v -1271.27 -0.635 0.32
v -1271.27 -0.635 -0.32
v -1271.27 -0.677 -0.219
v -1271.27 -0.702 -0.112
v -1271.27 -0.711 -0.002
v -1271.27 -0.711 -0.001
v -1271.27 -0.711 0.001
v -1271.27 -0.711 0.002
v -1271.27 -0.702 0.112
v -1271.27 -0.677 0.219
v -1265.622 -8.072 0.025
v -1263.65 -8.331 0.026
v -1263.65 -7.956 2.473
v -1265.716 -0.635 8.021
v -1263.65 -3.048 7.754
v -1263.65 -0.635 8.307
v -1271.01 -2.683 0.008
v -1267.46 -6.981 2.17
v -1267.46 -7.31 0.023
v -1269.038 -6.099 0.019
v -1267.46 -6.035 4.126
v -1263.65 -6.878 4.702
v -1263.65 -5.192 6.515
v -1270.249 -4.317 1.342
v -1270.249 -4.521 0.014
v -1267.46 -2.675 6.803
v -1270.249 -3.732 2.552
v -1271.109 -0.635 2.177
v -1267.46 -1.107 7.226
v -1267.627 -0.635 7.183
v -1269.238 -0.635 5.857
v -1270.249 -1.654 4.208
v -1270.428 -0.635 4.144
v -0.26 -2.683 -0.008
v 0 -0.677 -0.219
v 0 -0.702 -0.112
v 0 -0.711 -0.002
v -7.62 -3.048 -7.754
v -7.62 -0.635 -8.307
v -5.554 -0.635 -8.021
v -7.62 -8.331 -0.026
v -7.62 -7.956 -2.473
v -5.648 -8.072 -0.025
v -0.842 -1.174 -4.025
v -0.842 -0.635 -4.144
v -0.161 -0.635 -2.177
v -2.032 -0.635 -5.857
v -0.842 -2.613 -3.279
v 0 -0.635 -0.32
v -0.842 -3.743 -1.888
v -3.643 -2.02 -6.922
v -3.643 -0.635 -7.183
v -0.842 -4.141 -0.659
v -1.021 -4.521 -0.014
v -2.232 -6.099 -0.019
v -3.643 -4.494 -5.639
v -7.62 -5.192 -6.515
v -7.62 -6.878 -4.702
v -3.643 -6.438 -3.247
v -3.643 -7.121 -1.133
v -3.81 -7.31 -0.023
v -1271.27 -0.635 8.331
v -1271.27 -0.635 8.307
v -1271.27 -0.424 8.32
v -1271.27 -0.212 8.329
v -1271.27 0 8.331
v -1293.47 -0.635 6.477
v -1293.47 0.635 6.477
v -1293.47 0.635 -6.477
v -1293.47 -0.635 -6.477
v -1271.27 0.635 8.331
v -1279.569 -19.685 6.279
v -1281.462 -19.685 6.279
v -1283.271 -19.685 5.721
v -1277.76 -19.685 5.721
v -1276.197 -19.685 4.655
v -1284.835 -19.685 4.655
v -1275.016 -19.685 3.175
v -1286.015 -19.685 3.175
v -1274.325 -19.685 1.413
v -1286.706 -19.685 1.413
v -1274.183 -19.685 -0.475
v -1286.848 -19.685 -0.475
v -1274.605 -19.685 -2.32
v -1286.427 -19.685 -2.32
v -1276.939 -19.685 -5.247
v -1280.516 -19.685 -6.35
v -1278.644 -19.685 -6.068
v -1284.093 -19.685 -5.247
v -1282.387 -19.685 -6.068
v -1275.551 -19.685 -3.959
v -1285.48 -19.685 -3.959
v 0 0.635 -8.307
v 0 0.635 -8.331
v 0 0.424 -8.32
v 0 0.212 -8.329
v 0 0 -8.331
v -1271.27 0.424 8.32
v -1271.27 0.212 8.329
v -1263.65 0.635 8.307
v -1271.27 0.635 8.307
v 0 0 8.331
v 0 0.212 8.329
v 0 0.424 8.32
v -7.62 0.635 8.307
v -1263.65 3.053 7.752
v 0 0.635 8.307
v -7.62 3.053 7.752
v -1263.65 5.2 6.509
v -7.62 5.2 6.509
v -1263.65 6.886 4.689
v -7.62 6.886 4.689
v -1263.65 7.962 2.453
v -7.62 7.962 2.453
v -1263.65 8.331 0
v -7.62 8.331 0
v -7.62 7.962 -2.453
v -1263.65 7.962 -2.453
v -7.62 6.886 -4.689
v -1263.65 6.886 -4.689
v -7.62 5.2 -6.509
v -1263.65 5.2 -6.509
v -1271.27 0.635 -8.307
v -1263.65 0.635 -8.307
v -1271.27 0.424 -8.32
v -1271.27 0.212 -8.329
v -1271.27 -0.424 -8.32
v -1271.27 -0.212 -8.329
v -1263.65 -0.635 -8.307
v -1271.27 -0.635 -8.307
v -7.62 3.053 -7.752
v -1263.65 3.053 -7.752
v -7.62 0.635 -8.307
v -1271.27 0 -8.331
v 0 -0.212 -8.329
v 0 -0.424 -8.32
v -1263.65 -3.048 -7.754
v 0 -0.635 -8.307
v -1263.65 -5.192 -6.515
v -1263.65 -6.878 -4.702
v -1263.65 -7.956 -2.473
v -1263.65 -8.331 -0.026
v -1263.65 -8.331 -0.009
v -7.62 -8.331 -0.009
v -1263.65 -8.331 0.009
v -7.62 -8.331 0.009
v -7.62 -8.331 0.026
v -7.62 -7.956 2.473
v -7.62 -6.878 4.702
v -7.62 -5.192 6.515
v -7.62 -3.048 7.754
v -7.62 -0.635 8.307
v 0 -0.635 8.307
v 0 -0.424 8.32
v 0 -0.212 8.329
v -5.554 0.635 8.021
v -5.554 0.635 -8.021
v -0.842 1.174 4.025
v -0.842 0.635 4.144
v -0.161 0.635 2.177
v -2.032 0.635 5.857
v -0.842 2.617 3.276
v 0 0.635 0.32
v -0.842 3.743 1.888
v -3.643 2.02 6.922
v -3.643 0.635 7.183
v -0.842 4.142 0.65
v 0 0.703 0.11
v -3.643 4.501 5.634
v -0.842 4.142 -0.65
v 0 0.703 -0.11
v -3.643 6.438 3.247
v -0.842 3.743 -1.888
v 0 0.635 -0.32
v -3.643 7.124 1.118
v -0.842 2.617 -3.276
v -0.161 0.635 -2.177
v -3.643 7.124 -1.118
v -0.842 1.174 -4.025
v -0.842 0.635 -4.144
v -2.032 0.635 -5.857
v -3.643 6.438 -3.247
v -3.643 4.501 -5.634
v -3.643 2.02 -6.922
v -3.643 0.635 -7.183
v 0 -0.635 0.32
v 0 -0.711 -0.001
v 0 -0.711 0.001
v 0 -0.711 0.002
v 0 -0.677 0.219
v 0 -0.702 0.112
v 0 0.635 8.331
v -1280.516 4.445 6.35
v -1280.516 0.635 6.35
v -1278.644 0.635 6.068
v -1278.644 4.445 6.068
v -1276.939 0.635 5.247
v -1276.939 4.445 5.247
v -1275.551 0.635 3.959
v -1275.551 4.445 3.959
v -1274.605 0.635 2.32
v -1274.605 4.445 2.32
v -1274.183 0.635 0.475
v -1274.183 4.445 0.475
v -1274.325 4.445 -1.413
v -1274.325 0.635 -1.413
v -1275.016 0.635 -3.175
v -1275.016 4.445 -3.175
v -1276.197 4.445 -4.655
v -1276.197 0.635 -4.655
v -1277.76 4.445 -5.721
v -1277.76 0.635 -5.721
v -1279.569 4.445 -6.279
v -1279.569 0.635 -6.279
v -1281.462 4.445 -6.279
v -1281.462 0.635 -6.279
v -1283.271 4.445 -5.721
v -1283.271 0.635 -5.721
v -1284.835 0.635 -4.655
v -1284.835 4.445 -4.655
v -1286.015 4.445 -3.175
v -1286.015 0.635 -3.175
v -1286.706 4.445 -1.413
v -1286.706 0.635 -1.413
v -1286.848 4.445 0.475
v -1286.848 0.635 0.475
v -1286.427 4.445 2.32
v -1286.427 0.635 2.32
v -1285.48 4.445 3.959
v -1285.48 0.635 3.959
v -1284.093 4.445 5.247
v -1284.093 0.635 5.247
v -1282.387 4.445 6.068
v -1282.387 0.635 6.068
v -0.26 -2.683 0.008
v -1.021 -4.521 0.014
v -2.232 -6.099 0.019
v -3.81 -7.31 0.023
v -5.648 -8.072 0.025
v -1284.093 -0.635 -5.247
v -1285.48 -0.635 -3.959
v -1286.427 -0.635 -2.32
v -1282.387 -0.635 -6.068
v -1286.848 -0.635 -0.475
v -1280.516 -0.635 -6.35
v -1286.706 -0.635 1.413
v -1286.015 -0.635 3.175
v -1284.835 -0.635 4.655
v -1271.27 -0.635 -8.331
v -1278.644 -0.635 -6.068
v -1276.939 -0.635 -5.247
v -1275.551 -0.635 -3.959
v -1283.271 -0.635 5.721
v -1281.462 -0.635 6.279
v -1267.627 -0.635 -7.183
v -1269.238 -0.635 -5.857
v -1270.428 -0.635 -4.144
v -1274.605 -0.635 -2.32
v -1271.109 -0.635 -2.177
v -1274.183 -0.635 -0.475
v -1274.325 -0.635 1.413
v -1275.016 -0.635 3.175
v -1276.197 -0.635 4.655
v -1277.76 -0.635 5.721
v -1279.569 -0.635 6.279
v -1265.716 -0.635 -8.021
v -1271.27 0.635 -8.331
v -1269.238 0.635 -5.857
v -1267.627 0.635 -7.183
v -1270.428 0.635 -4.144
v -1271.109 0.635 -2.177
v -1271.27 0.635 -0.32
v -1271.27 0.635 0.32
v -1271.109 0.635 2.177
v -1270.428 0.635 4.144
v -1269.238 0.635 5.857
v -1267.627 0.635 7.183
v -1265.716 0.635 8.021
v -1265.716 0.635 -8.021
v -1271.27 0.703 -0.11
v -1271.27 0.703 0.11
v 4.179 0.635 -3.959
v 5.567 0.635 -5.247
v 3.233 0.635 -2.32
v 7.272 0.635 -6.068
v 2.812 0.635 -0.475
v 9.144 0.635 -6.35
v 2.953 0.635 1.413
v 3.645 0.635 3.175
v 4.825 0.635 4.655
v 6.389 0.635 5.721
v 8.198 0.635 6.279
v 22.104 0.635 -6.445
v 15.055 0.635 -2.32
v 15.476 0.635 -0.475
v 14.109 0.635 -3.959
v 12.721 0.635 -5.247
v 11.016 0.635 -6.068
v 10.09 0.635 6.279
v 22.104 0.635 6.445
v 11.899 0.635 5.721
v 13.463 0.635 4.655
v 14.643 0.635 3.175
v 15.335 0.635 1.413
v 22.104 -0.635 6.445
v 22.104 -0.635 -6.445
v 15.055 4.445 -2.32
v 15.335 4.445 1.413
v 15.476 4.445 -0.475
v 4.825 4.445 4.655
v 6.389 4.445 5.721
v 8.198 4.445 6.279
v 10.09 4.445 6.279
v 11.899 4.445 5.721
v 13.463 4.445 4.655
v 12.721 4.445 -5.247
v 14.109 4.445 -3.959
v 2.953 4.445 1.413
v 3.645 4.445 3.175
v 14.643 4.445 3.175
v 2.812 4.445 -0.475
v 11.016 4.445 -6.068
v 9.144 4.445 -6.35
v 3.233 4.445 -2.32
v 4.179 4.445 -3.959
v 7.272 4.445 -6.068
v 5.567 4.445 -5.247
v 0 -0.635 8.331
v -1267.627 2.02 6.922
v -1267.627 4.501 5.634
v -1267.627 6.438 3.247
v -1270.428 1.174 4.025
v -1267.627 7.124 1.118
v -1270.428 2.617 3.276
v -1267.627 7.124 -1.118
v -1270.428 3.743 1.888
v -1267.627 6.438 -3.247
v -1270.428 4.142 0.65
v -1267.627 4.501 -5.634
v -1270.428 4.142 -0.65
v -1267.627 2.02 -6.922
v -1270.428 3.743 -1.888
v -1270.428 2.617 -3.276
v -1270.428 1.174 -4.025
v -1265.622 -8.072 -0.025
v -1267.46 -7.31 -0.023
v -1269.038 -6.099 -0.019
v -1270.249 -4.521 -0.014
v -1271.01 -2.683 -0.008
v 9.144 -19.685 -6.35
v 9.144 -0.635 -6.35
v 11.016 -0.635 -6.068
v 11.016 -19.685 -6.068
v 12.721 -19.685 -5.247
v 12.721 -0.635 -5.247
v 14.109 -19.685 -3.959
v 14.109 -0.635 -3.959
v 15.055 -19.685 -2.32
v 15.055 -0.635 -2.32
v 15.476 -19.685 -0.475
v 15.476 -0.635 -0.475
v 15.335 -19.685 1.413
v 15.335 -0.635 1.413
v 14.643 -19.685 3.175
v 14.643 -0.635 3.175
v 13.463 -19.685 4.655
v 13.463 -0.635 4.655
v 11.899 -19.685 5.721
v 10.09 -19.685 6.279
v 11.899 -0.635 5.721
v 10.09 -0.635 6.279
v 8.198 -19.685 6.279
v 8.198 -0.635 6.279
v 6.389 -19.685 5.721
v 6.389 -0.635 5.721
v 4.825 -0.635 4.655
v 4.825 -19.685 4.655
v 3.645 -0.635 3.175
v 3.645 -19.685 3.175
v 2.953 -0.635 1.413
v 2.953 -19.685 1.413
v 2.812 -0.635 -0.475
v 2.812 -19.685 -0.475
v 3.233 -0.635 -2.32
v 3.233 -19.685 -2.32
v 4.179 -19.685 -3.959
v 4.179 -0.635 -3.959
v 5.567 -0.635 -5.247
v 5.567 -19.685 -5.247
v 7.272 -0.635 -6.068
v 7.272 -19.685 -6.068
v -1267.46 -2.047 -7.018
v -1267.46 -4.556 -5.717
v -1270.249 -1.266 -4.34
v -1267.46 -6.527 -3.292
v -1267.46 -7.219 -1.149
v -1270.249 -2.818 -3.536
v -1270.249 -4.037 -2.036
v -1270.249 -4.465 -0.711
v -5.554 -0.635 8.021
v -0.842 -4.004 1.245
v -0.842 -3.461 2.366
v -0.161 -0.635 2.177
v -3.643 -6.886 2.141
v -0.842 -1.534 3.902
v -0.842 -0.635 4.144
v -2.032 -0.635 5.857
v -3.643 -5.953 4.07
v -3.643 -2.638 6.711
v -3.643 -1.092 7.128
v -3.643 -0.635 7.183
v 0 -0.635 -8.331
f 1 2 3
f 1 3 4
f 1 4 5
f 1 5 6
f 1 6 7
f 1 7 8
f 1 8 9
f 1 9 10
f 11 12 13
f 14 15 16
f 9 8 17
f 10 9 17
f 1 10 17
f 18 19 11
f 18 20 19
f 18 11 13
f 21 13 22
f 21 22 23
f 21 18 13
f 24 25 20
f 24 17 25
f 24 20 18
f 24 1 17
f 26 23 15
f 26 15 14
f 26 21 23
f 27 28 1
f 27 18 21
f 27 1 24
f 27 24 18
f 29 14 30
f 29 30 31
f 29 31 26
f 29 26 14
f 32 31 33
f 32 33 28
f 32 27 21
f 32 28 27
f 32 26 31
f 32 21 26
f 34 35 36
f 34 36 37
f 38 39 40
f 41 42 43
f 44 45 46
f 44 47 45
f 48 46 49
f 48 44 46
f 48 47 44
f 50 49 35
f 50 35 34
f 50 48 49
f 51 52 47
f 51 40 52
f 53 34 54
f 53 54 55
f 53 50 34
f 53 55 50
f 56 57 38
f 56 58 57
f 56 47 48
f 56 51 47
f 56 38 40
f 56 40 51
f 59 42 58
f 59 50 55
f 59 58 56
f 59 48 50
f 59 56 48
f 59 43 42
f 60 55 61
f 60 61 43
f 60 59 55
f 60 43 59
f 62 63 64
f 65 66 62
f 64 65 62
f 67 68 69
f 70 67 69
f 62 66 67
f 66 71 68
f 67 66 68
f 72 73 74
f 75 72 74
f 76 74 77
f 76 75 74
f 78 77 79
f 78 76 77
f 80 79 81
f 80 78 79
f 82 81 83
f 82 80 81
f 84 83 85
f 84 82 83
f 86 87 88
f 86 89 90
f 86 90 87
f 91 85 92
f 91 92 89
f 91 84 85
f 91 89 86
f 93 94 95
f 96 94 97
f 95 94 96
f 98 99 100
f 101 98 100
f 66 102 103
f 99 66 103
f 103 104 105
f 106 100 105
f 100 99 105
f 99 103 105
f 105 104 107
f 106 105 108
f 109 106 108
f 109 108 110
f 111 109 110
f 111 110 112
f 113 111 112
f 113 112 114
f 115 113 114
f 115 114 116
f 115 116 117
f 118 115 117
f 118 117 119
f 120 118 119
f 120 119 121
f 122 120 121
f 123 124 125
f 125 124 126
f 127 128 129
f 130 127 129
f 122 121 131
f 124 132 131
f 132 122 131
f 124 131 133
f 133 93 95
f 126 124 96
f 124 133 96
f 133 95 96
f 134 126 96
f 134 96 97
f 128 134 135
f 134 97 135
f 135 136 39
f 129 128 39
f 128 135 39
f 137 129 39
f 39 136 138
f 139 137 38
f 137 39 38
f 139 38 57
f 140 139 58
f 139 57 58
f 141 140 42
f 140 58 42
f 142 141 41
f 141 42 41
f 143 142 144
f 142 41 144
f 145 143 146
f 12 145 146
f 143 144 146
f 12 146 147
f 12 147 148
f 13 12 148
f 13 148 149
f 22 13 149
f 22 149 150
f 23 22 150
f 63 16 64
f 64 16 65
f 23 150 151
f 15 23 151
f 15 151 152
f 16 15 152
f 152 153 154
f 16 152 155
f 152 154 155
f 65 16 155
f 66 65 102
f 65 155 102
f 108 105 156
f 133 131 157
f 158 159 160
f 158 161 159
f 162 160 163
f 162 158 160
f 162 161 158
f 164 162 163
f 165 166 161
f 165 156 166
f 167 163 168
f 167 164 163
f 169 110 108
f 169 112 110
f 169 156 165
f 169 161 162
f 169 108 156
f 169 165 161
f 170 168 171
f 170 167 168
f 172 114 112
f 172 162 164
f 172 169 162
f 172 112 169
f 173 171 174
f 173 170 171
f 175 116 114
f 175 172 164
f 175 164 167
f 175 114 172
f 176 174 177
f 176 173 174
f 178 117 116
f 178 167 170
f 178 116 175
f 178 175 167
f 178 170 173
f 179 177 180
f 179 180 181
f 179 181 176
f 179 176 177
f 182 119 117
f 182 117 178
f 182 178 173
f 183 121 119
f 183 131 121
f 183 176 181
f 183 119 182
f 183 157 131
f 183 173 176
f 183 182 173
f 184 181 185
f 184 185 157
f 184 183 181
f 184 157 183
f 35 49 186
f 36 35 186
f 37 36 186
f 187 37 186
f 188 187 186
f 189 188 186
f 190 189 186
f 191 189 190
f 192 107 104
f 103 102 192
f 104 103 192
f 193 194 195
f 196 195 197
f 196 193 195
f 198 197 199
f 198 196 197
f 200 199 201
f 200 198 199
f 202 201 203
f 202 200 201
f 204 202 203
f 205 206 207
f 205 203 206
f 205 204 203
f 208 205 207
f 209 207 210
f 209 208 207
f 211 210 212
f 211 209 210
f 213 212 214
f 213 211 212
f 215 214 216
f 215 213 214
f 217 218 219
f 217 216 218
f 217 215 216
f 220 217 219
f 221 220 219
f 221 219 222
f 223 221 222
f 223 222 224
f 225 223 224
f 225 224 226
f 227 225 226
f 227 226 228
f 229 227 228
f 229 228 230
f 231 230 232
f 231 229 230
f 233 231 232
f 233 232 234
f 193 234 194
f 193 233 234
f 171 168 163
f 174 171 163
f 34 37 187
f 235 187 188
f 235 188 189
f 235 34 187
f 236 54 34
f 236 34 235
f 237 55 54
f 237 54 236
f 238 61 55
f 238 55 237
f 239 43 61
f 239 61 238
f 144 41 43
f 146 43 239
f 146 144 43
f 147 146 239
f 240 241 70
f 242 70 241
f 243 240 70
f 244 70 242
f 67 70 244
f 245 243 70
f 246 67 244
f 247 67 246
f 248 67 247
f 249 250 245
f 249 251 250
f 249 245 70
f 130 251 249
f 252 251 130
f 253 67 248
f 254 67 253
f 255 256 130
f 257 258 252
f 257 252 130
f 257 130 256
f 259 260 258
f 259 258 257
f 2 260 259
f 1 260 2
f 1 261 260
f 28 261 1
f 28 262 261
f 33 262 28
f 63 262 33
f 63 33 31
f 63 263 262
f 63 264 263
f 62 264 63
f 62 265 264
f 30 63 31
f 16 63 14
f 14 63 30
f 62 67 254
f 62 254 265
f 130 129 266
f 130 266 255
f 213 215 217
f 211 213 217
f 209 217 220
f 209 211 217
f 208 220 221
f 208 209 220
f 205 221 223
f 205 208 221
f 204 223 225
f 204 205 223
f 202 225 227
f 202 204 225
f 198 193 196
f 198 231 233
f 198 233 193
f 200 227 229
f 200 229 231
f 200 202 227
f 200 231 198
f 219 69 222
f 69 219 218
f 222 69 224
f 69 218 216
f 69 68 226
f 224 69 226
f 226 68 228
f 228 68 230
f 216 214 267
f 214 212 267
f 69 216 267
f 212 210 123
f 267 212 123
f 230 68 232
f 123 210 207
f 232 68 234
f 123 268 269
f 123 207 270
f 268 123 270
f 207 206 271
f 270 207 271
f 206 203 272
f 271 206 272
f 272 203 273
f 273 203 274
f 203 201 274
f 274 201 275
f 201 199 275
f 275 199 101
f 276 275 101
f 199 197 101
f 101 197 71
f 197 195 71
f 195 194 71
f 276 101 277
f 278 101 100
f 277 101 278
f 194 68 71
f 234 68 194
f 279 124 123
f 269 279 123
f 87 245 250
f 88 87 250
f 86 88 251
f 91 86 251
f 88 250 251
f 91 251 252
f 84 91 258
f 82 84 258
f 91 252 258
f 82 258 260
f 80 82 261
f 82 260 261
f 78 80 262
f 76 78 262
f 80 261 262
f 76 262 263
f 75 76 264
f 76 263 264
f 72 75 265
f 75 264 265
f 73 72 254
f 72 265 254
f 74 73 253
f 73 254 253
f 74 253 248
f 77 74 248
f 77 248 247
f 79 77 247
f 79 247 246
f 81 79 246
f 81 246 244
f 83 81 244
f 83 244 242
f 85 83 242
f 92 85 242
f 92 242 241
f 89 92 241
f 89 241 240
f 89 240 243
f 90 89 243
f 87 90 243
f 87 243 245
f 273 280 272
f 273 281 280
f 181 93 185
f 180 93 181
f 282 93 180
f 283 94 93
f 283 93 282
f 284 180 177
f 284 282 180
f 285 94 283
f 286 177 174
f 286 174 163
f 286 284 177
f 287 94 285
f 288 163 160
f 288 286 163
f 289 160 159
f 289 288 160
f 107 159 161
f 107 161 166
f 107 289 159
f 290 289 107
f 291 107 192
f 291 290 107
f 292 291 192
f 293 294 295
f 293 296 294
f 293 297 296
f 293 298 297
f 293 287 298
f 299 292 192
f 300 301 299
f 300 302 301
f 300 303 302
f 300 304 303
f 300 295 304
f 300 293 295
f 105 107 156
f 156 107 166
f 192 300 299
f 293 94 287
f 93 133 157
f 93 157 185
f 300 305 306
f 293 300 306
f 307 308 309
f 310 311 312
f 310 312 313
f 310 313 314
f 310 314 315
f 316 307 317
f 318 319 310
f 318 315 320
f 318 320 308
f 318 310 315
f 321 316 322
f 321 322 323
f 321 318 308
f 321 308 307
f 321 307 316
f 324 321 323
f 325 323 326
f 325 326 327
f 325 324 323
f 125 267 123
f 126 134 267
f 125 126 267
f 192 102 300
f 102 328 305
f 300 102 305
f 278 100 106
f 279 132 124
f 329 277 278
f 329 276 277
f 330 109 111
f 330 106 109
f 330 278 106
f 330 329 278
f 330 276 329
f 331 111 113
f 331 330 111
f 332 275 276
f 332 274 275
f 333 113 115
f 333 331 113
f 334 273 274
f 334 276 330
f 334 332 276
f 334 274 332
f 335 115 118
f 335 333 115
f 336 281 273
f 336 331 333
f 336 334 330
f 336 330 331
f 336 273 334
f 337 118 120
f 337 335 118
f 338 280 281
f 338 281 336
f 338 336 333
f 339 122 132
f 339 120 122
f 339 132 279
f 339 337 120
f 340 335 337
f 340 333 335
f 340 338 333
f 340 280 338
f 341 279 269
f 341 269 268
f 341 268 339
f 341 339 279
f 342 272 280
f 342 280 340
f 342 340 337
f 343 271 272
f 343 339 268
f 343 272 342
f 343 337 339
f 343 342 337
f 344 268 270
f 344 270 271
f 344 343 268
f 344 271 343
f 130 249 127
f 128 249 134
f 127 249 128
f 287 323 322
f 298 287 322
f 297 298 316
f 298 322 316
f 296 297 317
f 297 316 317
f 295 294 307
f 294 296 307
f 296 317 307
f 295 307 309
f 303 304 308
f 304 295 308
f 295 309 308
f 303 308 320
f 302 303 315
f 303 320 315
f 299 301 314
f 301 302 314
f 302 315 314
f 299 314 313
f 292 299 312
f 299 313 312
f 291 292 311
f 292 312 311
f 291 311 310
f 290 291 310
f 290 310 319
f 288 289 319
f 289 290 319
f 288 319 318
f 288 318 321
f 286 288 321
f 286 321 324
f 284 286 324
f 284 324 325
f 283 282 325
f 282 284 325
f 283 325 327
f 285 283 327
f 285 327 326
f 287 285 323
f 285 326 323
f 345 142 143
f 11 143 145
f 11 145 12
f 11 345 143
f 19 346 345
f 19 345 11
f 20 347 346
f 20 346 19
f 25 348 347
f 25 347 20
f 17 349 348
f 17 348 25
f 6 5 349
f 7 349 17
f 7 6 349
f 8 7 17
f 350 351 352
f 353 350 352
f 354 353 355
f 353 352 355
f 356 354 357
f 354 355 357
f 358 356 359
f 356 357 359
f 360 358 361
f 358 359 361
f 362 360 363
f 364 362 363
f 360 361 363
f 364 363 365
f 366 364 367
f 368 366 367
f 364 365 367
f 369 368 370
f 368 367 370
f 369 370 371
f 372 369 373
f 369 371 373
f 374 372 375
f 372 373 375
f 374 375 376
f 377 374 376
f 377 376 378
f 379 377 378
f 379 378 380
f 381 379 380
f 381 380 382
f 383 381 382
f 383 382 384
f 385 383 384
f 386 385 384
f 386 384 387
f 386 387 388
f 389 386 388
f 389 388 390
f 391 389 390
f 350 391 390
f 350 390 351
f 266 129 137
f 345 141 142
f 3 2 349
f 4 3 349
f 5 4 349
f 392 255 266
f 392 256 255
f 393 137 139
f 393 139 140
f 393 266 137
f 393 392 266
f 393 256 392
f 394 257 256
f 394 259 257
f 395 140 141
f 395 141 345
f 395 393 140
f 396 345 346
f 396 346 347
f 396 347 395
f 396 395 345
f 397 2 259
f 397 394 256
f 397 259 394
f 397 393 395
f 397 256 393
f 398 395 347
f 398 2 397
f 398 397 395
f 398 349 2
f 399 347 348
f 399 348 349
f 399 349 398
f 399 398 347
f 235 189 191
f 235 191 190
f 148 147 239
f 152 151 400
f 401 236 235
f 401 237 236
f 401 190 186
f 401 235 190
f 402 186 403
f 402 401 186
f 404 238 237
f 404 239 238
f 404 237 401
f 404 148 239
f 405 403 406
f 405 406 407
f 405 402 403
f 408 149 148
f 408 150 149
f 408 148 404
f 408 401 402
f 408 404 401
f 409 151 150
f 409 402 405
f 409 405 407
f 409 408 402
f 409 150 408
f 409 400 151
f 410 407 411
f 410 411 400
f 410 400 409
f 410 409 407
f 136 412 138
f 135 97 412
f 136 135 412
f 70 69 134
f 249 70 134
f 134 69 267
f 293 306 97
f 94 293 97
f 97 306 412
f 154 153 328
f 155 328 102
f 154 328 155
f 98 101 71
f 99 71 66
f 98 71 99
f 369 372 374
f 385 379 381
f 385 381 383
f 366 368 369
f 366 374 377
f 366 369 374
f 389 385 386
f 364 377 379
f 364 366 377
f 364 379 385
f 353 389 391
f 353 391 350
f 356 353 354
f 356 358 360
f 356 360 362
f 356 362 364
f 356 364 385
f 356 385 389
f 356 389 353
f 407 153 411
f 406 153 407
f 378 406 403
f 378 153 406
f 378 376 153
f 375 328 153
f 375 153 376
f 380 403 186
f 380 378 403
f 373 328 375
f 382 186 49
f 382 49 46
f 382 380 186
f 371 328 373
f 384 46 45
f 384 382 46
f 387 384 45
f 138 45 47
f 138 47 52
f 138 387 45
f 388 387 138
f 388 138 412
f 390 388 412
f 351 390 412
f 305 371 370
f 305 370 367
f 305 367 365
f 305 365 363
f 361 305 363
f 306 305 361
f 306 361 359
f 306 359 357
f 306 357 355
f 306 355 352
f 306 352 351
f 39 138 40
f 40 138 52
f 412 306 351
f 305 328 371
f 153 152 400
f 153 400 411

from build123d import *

# Parameters (mm, degrees)
EXTRUSION1_DEPTH      = 0.635
EXTRUSION1_DEPTH_BACK = 0.635
SKETCH1_R             = 6.35
EXTRUSION2_DEPTH      = 19.05
EXTRUSION2_DEPTH_BACK = 19.05
SKETCH2_R             = 6.35
SKETCH3_R             = 6.35
EXTRUSION3_DEPTH      = 13.97
SKETCH4_R             = 6.35
EXTRUSION4_DEPTH      = 3.81
SKETCH5_R             = 8.3312
EXTRUSION5_DEPTH      = 1271.27
SKETCH6_R             = 6.35
EXTRUSION6_DEPTH      = 1.27
SKETCH7_R             = 6.35
EXTRUSION7_DEPTH      = 20.32
FILLET1_R             = 7.62


with BuildPart() as part:
    # Sketch1 → Extrusion1 (new, two sides: drawn at the far end of the back side and taken through both)
    with BuildSketch(Plane(origin=(0, 0, 0), x_dir=(-1, 0, 0), z_dir=(0, 1, 0)).offset(-EXTRUSION1_DEPTH_BACK)):
        Polygon((-22.104096049, 6.444983804), (-22.104096049, -6.444983804), (0, -8.3312), (0, 8.3312), align=None)
        with Locations(Location((-9.144, 0, 0), (0, 0, 90))):
            Circle(SKETCH1_R, mode=Mode.SUBTRACT)
    extrude(amount=EXTRUSION1_DEPTH + EXTRUSION1_DEPTH_BACK)

    # Sketch2 → Extrusion2 (add, two sides: drawn at the far end of the back side and taken through both)
    with BuildSketch(Plane.XZ.offset(0.635).offset(-EXTRUSION2_DEPTH_BACK)):
        with Locations(Location((9.144, 0, 0), (0, 0, 270))):
            Circle(SKETCH2_R)
    extrude(amount=EXTRUSION2_DEPTH + EXTRUSION2_DEPTH_BACK)

    # Sketch3 → Extrusion3 (cut)
    with BuildSketch(Plane(origin=(0, 18.415, 0), x_dir=(-1, 0, 0), z_dir=(0, 1, 0))):
        with Locations(Location((-9.144, 0, 0), (0, 0, 270))):
            Circle(SKETCH3_R)
    extrude(amount=-EXTRUSION3_DEPTH, mode=Mode.SUBTRACT)

    # Sketch5 → Extrusion5 (add)
    with BuildSketch(Plane.ZY):
        Circle(SKETCH5_R)
    extrude(amount=EXTRUSION5_DEPTH)

    # Sketch6 → Extrusion6 (add)
    with BuildSketch(Plane.XZ.offset(-0.635)):
        Polygon((-1293.4696, 0), (-1293.4696, -6.477), (-1271.27, -8.3312), (-1271.27, 8.3312), (-1293.4696, 6.477), align=None)
        with Locations(Location((-1280.5156, 0, 0), (0, 0, 90))):
            Circle(SKETCH6_R, mode=Mode.SUBTRACT)
    extrude(amount=EXTRUSION6_DEPTH)



with BuildPart() as body_2:
    # Sketch4 → Extrusion4 (new body)
    with BuildSketch(Plane(origin=(0, 4.445, 0), x_dir=(-1, 0, 0), z_dir=(0, 1, 0))):
        with Locations(Location((1280.5156, 0, 0), (0, 0, 90))):
            Circle(SKETCH4_R)
    extrude(amount=-EXTRUSION4_DEPTH)


with BuildPart() as part_1:
    add(part.part)

    add(body_2.part)  # Extrusion7 merges body 2
    # Sketch7 → Extrusion7 (add)
    with BuildSketch(Plane.XZ.offset(-0.635)):
        with Locations(Location((-1280.5156, 0, 0), (0, 0, 270))):
            Circle(SKETCH7_R)
    extrude(amount=EXTRUSION7_DEPTH)

    # Fillet1
    # the kernel refuses this fillet: 7.62 mm, written as the material it takes off along each edge
    with BuildSketch(Plane(origin=(-1271.27, 0, 0), x_dir=(0, -0.9999950652018581, 0.003141587485873656), z_dir=(0, -0.003141587485873656, -0.9999950652018581))) as fillet1_piece_1_section:
        with BuildLine():
            CenterArc((8.3312 - FILLET1_R, -FILLET1_R), FILLET1_R, 0, 90)
            Line((8.3312 - FILLET1_R, 0), (8.3312, 0))
            Line((8.3312, 0), (8.3312, -FILLET1_R))
        make_face()
    fillet1_piece_1 = revolve(axis=Axis((-1271.27, 0, 0), (-1, 0, 0)), revolution_arc=359.64, mode=Mode.PRIVATE)
    fillet1_piece_1 = split(fillet1_piece_1, bisect_by=Plane(origin=(-1269.374883086, -0.635, 4.28224122), z_dir=(0, -1, 0)), keep=Keep.TOP, mode=Mode.PRIVATE)
    add(fillet1_piece_1, mode=Mode.SUBTRACT)
    with BuildSketch(Plane(origin=(-1271.27, 0, 0), x_dir=(0, -0.9999950652018581, 0.003141587485873656), z_dir=(0, -0.003141587485873656, -0.9999950652018581))) as fillet1_piece_2_section:
        with BuildLine():
            CenterArc((8.3312 - FILLET1_R, -FILLET1_R), FILLET1_R, 0, 90)
            Line((8.3312 - FILLET1_R, 0), (8.3312, 0))
            Line((8.3312, 0), (8.3312, -FILLET1_R))
        make_face()
    fillet1_piece_2 = revolve(axis=Axis((-1271.27, 0, 0), (-1, 0, 0)), revolution_arc=359.64, mode=Mode.PRIVATE)
    fillet1_piece_2 = split(fillet1_piece_2, bisect_by=Plane(origin=(-1269.082318262, 0.635, 0), z_dir=(0, 1, 0)), keep=Keep.TOP, mode=Mode.PRIVATE)
    add(fillet1_piece_2, mode=Mode.SUBTRACT)
    with BuildSketch(Plane(origin=(0, 0, 0), x_dir=(0, -0.9999950652018581, 0.003141587485874322), z_dir=(0, -0.003141587485874322, -0.9999950652018581))) as fillet1_piece_3_section:
        with BuildLine():
            CenterArc((8.3312 - FILLET1_R, FILLET1_R), FILLET1_R, 270, 90)
            Line((8.3312, FILLET1_R), (8.3312, 0))
            Line((8.3312, 0), (8.3312 - FILLET1_R, 0))
        make_face()
    fillet1_piece_3 = revolve(axis=Axis((0, 0, 0), (-1, 0, 0)), revolution_arc=359.64, mode=Mode.PRIVATE)
    fillet1_piece_3 = split(fillet1_piece_3, bisect_by=Plane(origin=(-1.895117191, -0.635, 4.282241186), z_dir=(0, -1, 0)), keep=Keep.TOP, mode=Mode.PRIVATE)
    add(fillet1_piece_3, mode=Mode.SUBTRACT)
    with BuildSketch(Plane(origin=(0, 0, 0), x_dir=(0, -0.9999950652018581, 0.003141587485874322), z_dir=(0, -0.003141587485874322, -0.9999950652018581))) as fillet1_piece_4_section:
        with BuildLine():
            CenterArc((8.3312 - FILLET1_R, FILLET1_R), FILLET1_R, 270, 90)
            Line((8.3312, FILLET1_R), (8.3312, 0))
            Line((8.3312, 0), (8.3312 - FILLET1_R, 0))
        make_face()
    fillet1_piece_4 = revolve(axis=Axis((0, 0, 0), (-1, 0, 0)), revolution_arc=359.64, mode=Mode.PRIVATE)
    fillet1_piece_4 = split(fillet1_piece_4, bisect_by=Plane(origin=(-2.187681733, 0.635, 0), z_dir=(0, 1, 0)), keep=Keep.TOP, mode=Mode.PRIVATE)
    add(fillet1_piece_4, mode=Mode.SUBTRACT)
    with BuildSketch(Plane(origin=(0, 0, 0), x_dir=(0, 0.9999950652018581, -0.00314158748588508), z_dir=(0, 0.00314158748588508, 0.9999950652018581))) as fillet1_piece_5_section:
        with BuildLine():
            CenterArc((8.3312 - FILLET1_R, FILLET1_R), FILLET1_R, 270, 90)
            Line((8.3312, FILLET1_R), (8.3312, 0))
            Line((8.3312, 0), (8.3312 - FILLET1_R, 0))
        make_face()
    fillet1_piece_5 = revolve(axis=Axis((0, 0, 0), (-1, 0, 0)), revolution_arc=359.64, mode=Mode.PRIVATE)
    fillet1_piece_5 = split(fillet1_piece_5, bisect_by=Plane(origin=(-1.895117191, 0.635, -4.282241186), z_dir=(0, 1, 0)), keep=Keep.TOP, mode=Mode.PRIVATE)
    add(fillet1_piece_5, mode=Mode.SUBTRACT)
    with BuildSketch(Plane(origin=(0, 0, 0), x_dir=(0, 0.9999950652018581, -0.00314158748588508), z_dir=(0, 0.00314158748588508, 0.9999950652018581))) as fillet1_piece_6_section:
        with BuildLine():
            CenterArc((8.3312 - FILLET1_R, FILLET1_R), FILLET1_R, 270, 90)
            Line((8.3312, FILLET1_R), (8.3312, 0))
            Line((8.3312, 0), (8.3312 - FILLET1_R, 0))
        make_face()
    fillet1_piece_6 = revolve(axis=Axis((0, 0, 0), (-1, 0, 0)), revolution_arc=359.64, mode=Mode.PRIVATE)
    fillet1_piece_6 = split(fillet1_piece_6, bisect_by=Plane(origin=(-2.187681733, -0.635, 0), z_dir=(0, -1, 0)), keep=Keep.TOP, mode=Mode.PRIVATE)
    add(fillet1_piece_6, mode=Mode.SUBTRACT)
    with BuildSketch(Plane(origin=(-1271.27, 0, 0), x_dir=(0, 0.9999950652018581, -0.003141587485884858), z_dir=(0, 0.003141587485884858, 0.9999950652018581))) as fillet1_piece_7_section:
        with BuildLine():
            CenterArc((8.3312 - FILLET1_R, -FILLET1_R), FILLET1_R, 0, 90)
            Line((8.3312 - FILLET1_R, 0), (8.3312, 0))
            Line((8.3312, 0), (8.3312, -FILLET1_R))
        make_face()
    fillet1_piece_7 = revolve(axis=Axis((-1271.27, 0, 0), (-1, 0, 0)), revolution_arc=359.64, mode=Mode.PRIVATE)
    fillet1_piece_7 = split(fillet1_piece_7, bisect_by=Plane(origin=(-1269.374883188, 0.635, -4.282241233), z_dir=(0, 1, 0)), keep=Keep.TOP, mode=Mode.PRIVATE)
    add(fillet1_piece_7, mode=Mode.SUBTRACT)
    with BuildSketch(Plane(origin=(-1271.27, 0, 0), x_dir=(0, 0.9999950652018581, -0.003141587485884858), z_dir=(0, 0.003141587485884858, 0.9999950652018581))) as fillet1_piece_8_section:
        with BuildLine():
            CenterArc((8.3312 - FILLET1_R, -FILLET1_R), FILLET1_R, 0, 90)
            Line((8.3312 - FILLET1_R, 0), (8.3312, 0))
            Line((8.3312, 0), (8.3312, -FILLET1_R))
        make_face()
    fillet1_piece_8 = revolve(axis=Axis((-1271.27, 0, 0), (-1, 0, 0)), revolution_arc=359.64, mode=Mode.PRIVATE)
    fillet1_piece_8 = split(fillet1_piece_8, bisect_by=Plane(origin=(-1269.082318263, -0.635, 0), z_dir=(0, -1, 0)), keep=Keep.TOP, mode=Mode.PRIVATE)
    add(fillet1_piece_8, mode=Mode.SUBTRACT)


solid = part_1.part
